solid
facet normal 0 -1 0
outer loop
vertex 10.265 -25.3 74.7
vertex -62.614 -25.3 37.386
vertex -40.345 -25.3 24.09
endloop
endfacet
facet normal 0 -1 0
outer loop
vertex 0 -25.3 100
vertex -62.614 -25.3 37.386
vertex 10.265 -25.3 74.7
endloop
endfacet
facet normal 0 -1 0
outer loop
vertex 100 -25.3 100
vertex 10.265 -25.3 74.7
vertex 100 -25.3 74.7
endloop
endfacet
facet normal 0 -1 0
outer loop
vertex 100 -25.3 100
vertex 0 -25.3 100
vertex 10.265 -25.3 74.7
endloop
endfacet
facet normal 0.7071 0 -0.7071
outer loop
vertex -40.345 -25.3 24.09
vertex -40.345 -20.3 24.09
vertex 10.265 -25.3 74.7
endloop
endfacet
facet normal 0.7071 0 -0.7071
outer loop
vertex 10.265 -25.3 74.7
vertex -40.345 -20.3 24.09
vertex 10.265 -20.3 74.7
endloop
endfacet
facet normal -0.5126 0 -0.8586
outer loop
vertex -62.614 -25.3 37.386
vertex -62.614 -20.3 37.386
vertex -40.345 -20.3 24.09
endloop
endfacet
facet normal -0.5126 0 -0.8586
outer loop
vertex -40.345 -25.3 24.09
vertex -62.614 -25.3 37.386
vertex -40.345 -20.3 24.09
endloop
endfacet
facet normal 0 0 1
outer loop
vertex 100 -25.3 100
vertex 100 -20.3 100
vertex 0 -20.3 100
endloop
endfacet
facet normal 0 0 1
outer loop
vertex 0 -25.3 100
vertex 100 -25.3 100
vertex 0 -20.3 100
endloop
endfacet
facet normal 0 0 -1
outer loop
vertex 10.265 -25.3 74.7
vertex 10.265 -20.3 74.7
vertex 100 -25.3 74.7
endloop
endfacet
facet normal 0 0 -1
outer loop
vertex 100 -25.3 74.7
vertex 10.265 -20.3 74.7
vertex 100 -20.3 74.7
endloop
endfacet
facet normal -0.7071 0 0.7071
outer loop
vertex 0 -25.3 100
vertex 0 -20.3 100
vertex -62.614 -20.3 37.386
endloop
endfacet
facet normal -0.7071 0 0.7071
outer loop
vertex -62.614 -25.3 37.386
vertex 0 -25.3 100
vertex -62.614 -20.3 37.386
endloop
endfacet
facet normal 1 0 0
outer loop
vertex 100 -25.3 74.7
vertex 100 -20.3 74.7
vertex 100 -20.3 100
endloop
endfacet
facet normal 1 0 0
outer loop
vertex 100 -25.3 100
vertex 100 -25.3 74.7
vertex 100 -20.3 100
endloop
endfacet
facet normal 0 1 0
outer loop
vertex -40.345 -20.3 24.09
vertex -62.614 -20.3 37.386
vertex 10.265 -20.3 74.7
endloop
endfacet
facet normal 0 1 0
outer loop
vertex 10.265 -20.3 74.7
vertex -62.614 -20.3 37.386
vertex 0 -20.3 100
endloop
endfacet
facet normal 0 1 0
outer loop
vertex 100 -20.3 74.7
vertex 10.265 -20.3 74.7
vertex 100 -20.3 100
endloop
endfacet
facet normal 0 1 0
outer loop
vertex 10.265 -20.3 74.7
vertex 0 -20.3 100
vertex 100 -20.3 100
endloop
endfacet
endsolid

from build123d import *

# Parameters (mm, degrees)
BOSS_EXTRUDE4_DEPTH = 5


with BuildPart() as part:
    # Sketch5 → Boss-Extrude4 (new body)
    with BuildSketch(Plane.XZ.offset(20.3)):
        Polygon((0, 100), (-62.613989109, 37.386010891), (-40.345458425, 24.089756452), (10.264785123, 74.7), (100, 74.7), (100, 100), align=None)
    extrude(amount=BOSS_EXTRUDE4_DEPTH)


solid = part.part
